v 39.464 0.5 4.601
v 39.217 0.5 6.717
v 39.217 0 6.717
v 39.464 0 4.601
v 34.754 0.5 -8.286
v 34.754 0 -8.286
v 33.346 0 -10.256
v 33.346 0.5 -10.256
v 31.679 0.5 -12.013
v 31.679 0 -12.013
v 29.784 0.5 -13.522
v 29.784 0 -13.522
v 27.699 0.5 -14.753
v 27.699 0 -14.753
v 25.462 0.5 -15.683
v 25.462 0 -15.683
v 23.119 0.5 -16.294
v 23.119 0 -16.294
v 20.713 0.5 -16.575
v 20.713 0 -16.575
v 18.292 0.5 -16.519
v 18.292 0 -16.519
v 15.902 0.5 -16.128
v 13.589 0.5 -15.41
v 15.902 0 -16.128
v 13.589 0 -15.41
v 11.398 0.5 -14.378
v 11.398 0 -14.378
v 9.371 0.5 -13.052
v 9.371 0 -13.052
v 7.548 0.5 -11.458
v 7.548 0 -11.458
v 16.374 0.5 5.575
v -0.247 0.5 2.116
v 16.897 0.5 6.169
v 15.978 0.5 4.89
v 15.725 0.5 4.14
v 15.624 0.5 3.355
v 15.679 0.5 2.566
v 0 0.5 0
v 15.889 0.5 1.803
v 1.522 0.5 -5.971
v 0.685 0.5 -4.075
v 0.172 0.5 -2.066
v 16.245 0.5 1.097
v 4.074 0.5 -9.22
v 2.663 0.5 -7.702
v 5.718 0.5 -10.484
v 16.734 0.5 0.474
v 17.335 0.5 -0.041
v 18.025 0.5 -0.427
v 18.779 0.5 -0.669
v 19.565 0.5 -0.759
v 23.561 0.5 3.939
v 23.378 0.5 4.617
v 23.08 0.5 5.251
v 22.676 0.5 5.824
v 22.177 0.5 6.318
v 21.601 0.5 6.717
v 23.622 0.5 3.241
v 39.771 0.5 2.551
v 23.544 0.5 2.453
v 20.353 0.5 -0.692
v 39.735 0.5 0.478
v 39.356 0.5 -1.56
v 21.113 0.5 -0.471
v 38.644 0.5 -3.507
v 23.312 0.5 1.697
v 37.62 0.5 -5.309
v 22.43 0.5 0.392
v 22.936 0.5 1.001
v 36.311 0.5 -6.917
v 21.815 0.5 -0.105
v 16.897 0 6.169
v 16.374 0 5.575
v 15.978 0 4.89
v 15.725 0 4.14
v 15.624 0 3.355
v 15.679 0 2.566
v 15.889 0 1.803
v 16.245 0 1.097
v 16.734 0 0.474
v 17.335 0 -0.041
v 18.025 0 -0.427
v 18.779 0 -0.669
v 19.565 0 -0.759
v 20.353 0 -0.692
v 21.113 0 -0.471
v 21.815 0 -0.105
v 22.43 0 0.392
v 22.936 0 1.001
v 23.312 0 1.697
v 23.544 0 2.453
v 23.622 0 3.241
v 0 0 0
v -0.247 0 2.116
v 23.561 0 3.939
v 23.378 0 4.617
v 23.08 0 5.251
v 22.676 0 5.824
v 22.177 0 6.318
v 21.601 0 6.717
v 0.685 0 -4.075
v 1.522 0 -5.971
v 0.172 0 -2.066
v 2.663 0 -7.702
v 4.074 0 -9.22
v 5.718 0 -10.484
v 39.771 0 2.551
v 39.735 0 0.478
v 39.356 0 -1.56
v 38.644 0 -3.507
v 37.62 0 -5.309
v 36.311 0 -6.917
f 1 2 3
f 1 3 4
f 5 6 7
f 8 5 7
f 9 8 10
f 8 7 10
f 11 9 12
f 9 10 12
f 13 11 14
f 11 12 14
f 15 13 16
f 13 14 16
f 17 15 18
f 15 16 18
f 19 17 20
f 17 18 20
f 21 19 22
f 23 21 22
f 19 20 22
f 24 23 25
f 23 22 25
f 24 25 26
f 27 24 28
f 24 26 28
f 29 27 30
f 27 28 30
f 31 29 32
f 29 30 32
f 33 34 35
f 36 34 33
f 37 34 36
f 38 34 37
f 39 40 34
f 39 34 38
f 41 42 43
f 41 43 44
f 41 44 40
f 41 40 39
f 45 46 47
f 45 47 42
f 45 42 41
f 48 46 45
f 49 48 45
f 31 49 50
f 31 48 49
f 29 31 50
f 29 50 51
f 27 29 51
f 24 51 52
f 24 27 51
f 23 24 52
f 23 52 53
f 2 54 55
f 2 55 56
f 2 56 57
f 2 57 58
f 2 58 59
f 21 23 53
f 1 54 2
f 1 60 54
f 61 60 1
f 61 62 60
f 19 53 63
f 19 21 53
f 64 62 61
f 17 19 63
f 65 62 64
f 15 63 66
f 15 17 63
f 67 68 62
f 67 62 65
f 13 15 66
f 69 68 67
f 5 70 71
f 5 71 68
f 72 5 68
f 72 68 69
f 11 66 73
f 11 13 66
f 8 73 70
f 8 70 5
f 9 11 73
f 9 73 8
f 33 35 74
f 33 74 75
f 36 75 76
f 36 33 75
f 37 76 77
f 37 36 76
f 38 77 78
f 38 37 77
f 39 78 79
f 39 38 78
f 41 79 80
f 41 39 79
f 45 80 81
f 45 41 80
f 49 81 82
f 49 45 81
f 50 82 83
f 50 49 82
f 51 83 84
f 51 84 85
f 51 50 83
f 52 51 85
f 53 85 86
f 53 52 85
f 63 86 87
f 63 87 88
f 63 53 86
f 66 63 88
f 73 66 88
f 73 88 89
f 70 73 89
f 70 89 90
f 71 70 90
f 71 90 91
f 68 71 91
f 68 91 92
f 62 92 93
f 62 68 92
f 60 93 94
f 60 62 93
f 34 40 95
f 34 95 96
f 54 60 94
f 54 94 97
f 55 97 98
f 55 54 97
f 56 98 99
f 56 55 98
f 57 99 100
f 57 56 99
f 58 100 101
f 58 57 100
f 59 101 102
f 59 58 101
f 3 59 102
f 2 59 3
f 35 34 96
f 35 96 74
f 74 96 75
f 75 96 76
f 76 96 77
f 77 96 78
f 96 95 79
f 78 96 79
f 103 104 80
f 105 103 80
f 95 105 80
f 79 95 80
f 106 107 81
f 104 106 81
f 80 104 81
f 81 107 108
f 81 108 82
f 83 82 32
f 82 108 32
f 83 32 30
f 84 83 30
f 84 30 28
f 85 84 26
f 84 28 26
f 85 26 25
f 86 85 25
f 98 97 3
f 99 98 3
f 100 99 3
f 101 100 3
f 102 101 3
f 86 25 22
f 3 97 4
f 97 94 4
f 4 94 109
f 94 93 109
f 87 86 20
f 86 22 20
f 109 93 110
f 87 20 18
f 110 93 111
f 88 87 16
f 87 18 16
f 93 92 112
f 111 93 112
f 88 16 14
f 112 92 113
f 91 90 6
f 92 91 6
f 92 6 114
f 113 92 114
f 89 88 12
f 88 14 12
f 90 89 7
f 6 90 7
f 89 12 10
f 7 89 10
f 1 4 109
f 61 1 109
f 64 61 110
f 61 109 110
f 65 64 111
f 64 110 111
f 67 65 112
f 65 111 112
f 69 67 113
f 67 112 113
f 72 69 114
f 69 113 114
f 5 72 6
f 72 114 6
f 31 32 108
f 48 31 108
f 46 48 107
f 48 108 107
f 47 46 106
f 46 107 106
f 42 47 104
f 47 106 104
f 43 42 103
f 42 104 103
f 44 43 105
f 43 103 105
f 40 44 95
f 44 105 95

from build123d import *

# Parameters (mm, degrees)
SALIENTE_EXTRUIR2_DEPTH = 0.5
CORTAR_EXTRUIR1_DEPTH   = 0.5
SALIENTE_EXTRUIR3_DEPTH = 0.5


with BuildPart() as part:
    # Croquis2 → Saliente-Extruir2 (new body)
    with BuildSketch(Plane(origin=(0, 0, 0), x_dir=(1, 0, 0), z_dir=(0, 1, 0))):
        with BuildLine():
            Line((0, 0), (20, 0))
            Line((20, 0), (39.463577456, -4.600994744))
            ThreePointArc((39.463577456, -4.600994744), (39.040324802, 2.548287638), (34.753818463, 8.285642846))
            ThreePointArc((34.753818463, 8.285642846), (21.920955681, 16.476389899), (7.548005539, 11.457524625))
            ThreePointArc((7.548005539, 11.457524625), (2.056591074, 6.860161407), (0, 0))
        make_face()
    extrude(amount=SALIENTE_EXTRUIR2_DEPTH)

    # Croquis3 → Cortar-Extruir1 (cut)
    with BuildSketch(Plane(origin=(0, 0.5, 0), x_dir=(1, 0, 0), z_dir=(0, 1, 0))):
        with BuildLine():
            Line((20, 0), (16.5, 0))
            ThreePointArc((16.5, 0), (20.143291885, 1.229040833), (23.406126055, -0.80517408))
            Line((23.406126055, -0.80517408), (20, 0))
        make_face()
    extrude(amount=-CORTAR_EXTRUIR1_DEPTH, mode=Mode.SUBTRACT)

    # Croquis4 → Saliente-Extruir3 (add)
    with BuildSketch(Plane(origin=(0, 0.5, 0), x_dir=(1, 0, 0), z_dir=(0, 1, 0))):
        with BuildLine():
            Line((-0.246717473, -2.116141109), (16.897027571, -6.168750709))
            ThreePointArc((16.897027571, -6.168750709), (18.02539366, 0.426780522), (23.62217394, -3.240683553))
            ThreePointArc((23.62217394, -3.240683553), (23.080050106, -5.251427798), (21.600627731, -6.717135853))
            Line((21.600627731, -6.717135853), (39.216859982, -6.717135853))
            Line((39.216859982, -6.717135853), (39.463577456, -4.600994744))
            Line((39.463577456, -4.600994744), (20.690616261, 2.904236285))
            Line((20.690616261, 2.904236285), (0, 0))
            Line((0, 0), (-0.246717473, -2.116141109))
        make_face()
    extrude(amount=-SALIENTE_EXTRUIR3_DEPTH)


solid = part.part
